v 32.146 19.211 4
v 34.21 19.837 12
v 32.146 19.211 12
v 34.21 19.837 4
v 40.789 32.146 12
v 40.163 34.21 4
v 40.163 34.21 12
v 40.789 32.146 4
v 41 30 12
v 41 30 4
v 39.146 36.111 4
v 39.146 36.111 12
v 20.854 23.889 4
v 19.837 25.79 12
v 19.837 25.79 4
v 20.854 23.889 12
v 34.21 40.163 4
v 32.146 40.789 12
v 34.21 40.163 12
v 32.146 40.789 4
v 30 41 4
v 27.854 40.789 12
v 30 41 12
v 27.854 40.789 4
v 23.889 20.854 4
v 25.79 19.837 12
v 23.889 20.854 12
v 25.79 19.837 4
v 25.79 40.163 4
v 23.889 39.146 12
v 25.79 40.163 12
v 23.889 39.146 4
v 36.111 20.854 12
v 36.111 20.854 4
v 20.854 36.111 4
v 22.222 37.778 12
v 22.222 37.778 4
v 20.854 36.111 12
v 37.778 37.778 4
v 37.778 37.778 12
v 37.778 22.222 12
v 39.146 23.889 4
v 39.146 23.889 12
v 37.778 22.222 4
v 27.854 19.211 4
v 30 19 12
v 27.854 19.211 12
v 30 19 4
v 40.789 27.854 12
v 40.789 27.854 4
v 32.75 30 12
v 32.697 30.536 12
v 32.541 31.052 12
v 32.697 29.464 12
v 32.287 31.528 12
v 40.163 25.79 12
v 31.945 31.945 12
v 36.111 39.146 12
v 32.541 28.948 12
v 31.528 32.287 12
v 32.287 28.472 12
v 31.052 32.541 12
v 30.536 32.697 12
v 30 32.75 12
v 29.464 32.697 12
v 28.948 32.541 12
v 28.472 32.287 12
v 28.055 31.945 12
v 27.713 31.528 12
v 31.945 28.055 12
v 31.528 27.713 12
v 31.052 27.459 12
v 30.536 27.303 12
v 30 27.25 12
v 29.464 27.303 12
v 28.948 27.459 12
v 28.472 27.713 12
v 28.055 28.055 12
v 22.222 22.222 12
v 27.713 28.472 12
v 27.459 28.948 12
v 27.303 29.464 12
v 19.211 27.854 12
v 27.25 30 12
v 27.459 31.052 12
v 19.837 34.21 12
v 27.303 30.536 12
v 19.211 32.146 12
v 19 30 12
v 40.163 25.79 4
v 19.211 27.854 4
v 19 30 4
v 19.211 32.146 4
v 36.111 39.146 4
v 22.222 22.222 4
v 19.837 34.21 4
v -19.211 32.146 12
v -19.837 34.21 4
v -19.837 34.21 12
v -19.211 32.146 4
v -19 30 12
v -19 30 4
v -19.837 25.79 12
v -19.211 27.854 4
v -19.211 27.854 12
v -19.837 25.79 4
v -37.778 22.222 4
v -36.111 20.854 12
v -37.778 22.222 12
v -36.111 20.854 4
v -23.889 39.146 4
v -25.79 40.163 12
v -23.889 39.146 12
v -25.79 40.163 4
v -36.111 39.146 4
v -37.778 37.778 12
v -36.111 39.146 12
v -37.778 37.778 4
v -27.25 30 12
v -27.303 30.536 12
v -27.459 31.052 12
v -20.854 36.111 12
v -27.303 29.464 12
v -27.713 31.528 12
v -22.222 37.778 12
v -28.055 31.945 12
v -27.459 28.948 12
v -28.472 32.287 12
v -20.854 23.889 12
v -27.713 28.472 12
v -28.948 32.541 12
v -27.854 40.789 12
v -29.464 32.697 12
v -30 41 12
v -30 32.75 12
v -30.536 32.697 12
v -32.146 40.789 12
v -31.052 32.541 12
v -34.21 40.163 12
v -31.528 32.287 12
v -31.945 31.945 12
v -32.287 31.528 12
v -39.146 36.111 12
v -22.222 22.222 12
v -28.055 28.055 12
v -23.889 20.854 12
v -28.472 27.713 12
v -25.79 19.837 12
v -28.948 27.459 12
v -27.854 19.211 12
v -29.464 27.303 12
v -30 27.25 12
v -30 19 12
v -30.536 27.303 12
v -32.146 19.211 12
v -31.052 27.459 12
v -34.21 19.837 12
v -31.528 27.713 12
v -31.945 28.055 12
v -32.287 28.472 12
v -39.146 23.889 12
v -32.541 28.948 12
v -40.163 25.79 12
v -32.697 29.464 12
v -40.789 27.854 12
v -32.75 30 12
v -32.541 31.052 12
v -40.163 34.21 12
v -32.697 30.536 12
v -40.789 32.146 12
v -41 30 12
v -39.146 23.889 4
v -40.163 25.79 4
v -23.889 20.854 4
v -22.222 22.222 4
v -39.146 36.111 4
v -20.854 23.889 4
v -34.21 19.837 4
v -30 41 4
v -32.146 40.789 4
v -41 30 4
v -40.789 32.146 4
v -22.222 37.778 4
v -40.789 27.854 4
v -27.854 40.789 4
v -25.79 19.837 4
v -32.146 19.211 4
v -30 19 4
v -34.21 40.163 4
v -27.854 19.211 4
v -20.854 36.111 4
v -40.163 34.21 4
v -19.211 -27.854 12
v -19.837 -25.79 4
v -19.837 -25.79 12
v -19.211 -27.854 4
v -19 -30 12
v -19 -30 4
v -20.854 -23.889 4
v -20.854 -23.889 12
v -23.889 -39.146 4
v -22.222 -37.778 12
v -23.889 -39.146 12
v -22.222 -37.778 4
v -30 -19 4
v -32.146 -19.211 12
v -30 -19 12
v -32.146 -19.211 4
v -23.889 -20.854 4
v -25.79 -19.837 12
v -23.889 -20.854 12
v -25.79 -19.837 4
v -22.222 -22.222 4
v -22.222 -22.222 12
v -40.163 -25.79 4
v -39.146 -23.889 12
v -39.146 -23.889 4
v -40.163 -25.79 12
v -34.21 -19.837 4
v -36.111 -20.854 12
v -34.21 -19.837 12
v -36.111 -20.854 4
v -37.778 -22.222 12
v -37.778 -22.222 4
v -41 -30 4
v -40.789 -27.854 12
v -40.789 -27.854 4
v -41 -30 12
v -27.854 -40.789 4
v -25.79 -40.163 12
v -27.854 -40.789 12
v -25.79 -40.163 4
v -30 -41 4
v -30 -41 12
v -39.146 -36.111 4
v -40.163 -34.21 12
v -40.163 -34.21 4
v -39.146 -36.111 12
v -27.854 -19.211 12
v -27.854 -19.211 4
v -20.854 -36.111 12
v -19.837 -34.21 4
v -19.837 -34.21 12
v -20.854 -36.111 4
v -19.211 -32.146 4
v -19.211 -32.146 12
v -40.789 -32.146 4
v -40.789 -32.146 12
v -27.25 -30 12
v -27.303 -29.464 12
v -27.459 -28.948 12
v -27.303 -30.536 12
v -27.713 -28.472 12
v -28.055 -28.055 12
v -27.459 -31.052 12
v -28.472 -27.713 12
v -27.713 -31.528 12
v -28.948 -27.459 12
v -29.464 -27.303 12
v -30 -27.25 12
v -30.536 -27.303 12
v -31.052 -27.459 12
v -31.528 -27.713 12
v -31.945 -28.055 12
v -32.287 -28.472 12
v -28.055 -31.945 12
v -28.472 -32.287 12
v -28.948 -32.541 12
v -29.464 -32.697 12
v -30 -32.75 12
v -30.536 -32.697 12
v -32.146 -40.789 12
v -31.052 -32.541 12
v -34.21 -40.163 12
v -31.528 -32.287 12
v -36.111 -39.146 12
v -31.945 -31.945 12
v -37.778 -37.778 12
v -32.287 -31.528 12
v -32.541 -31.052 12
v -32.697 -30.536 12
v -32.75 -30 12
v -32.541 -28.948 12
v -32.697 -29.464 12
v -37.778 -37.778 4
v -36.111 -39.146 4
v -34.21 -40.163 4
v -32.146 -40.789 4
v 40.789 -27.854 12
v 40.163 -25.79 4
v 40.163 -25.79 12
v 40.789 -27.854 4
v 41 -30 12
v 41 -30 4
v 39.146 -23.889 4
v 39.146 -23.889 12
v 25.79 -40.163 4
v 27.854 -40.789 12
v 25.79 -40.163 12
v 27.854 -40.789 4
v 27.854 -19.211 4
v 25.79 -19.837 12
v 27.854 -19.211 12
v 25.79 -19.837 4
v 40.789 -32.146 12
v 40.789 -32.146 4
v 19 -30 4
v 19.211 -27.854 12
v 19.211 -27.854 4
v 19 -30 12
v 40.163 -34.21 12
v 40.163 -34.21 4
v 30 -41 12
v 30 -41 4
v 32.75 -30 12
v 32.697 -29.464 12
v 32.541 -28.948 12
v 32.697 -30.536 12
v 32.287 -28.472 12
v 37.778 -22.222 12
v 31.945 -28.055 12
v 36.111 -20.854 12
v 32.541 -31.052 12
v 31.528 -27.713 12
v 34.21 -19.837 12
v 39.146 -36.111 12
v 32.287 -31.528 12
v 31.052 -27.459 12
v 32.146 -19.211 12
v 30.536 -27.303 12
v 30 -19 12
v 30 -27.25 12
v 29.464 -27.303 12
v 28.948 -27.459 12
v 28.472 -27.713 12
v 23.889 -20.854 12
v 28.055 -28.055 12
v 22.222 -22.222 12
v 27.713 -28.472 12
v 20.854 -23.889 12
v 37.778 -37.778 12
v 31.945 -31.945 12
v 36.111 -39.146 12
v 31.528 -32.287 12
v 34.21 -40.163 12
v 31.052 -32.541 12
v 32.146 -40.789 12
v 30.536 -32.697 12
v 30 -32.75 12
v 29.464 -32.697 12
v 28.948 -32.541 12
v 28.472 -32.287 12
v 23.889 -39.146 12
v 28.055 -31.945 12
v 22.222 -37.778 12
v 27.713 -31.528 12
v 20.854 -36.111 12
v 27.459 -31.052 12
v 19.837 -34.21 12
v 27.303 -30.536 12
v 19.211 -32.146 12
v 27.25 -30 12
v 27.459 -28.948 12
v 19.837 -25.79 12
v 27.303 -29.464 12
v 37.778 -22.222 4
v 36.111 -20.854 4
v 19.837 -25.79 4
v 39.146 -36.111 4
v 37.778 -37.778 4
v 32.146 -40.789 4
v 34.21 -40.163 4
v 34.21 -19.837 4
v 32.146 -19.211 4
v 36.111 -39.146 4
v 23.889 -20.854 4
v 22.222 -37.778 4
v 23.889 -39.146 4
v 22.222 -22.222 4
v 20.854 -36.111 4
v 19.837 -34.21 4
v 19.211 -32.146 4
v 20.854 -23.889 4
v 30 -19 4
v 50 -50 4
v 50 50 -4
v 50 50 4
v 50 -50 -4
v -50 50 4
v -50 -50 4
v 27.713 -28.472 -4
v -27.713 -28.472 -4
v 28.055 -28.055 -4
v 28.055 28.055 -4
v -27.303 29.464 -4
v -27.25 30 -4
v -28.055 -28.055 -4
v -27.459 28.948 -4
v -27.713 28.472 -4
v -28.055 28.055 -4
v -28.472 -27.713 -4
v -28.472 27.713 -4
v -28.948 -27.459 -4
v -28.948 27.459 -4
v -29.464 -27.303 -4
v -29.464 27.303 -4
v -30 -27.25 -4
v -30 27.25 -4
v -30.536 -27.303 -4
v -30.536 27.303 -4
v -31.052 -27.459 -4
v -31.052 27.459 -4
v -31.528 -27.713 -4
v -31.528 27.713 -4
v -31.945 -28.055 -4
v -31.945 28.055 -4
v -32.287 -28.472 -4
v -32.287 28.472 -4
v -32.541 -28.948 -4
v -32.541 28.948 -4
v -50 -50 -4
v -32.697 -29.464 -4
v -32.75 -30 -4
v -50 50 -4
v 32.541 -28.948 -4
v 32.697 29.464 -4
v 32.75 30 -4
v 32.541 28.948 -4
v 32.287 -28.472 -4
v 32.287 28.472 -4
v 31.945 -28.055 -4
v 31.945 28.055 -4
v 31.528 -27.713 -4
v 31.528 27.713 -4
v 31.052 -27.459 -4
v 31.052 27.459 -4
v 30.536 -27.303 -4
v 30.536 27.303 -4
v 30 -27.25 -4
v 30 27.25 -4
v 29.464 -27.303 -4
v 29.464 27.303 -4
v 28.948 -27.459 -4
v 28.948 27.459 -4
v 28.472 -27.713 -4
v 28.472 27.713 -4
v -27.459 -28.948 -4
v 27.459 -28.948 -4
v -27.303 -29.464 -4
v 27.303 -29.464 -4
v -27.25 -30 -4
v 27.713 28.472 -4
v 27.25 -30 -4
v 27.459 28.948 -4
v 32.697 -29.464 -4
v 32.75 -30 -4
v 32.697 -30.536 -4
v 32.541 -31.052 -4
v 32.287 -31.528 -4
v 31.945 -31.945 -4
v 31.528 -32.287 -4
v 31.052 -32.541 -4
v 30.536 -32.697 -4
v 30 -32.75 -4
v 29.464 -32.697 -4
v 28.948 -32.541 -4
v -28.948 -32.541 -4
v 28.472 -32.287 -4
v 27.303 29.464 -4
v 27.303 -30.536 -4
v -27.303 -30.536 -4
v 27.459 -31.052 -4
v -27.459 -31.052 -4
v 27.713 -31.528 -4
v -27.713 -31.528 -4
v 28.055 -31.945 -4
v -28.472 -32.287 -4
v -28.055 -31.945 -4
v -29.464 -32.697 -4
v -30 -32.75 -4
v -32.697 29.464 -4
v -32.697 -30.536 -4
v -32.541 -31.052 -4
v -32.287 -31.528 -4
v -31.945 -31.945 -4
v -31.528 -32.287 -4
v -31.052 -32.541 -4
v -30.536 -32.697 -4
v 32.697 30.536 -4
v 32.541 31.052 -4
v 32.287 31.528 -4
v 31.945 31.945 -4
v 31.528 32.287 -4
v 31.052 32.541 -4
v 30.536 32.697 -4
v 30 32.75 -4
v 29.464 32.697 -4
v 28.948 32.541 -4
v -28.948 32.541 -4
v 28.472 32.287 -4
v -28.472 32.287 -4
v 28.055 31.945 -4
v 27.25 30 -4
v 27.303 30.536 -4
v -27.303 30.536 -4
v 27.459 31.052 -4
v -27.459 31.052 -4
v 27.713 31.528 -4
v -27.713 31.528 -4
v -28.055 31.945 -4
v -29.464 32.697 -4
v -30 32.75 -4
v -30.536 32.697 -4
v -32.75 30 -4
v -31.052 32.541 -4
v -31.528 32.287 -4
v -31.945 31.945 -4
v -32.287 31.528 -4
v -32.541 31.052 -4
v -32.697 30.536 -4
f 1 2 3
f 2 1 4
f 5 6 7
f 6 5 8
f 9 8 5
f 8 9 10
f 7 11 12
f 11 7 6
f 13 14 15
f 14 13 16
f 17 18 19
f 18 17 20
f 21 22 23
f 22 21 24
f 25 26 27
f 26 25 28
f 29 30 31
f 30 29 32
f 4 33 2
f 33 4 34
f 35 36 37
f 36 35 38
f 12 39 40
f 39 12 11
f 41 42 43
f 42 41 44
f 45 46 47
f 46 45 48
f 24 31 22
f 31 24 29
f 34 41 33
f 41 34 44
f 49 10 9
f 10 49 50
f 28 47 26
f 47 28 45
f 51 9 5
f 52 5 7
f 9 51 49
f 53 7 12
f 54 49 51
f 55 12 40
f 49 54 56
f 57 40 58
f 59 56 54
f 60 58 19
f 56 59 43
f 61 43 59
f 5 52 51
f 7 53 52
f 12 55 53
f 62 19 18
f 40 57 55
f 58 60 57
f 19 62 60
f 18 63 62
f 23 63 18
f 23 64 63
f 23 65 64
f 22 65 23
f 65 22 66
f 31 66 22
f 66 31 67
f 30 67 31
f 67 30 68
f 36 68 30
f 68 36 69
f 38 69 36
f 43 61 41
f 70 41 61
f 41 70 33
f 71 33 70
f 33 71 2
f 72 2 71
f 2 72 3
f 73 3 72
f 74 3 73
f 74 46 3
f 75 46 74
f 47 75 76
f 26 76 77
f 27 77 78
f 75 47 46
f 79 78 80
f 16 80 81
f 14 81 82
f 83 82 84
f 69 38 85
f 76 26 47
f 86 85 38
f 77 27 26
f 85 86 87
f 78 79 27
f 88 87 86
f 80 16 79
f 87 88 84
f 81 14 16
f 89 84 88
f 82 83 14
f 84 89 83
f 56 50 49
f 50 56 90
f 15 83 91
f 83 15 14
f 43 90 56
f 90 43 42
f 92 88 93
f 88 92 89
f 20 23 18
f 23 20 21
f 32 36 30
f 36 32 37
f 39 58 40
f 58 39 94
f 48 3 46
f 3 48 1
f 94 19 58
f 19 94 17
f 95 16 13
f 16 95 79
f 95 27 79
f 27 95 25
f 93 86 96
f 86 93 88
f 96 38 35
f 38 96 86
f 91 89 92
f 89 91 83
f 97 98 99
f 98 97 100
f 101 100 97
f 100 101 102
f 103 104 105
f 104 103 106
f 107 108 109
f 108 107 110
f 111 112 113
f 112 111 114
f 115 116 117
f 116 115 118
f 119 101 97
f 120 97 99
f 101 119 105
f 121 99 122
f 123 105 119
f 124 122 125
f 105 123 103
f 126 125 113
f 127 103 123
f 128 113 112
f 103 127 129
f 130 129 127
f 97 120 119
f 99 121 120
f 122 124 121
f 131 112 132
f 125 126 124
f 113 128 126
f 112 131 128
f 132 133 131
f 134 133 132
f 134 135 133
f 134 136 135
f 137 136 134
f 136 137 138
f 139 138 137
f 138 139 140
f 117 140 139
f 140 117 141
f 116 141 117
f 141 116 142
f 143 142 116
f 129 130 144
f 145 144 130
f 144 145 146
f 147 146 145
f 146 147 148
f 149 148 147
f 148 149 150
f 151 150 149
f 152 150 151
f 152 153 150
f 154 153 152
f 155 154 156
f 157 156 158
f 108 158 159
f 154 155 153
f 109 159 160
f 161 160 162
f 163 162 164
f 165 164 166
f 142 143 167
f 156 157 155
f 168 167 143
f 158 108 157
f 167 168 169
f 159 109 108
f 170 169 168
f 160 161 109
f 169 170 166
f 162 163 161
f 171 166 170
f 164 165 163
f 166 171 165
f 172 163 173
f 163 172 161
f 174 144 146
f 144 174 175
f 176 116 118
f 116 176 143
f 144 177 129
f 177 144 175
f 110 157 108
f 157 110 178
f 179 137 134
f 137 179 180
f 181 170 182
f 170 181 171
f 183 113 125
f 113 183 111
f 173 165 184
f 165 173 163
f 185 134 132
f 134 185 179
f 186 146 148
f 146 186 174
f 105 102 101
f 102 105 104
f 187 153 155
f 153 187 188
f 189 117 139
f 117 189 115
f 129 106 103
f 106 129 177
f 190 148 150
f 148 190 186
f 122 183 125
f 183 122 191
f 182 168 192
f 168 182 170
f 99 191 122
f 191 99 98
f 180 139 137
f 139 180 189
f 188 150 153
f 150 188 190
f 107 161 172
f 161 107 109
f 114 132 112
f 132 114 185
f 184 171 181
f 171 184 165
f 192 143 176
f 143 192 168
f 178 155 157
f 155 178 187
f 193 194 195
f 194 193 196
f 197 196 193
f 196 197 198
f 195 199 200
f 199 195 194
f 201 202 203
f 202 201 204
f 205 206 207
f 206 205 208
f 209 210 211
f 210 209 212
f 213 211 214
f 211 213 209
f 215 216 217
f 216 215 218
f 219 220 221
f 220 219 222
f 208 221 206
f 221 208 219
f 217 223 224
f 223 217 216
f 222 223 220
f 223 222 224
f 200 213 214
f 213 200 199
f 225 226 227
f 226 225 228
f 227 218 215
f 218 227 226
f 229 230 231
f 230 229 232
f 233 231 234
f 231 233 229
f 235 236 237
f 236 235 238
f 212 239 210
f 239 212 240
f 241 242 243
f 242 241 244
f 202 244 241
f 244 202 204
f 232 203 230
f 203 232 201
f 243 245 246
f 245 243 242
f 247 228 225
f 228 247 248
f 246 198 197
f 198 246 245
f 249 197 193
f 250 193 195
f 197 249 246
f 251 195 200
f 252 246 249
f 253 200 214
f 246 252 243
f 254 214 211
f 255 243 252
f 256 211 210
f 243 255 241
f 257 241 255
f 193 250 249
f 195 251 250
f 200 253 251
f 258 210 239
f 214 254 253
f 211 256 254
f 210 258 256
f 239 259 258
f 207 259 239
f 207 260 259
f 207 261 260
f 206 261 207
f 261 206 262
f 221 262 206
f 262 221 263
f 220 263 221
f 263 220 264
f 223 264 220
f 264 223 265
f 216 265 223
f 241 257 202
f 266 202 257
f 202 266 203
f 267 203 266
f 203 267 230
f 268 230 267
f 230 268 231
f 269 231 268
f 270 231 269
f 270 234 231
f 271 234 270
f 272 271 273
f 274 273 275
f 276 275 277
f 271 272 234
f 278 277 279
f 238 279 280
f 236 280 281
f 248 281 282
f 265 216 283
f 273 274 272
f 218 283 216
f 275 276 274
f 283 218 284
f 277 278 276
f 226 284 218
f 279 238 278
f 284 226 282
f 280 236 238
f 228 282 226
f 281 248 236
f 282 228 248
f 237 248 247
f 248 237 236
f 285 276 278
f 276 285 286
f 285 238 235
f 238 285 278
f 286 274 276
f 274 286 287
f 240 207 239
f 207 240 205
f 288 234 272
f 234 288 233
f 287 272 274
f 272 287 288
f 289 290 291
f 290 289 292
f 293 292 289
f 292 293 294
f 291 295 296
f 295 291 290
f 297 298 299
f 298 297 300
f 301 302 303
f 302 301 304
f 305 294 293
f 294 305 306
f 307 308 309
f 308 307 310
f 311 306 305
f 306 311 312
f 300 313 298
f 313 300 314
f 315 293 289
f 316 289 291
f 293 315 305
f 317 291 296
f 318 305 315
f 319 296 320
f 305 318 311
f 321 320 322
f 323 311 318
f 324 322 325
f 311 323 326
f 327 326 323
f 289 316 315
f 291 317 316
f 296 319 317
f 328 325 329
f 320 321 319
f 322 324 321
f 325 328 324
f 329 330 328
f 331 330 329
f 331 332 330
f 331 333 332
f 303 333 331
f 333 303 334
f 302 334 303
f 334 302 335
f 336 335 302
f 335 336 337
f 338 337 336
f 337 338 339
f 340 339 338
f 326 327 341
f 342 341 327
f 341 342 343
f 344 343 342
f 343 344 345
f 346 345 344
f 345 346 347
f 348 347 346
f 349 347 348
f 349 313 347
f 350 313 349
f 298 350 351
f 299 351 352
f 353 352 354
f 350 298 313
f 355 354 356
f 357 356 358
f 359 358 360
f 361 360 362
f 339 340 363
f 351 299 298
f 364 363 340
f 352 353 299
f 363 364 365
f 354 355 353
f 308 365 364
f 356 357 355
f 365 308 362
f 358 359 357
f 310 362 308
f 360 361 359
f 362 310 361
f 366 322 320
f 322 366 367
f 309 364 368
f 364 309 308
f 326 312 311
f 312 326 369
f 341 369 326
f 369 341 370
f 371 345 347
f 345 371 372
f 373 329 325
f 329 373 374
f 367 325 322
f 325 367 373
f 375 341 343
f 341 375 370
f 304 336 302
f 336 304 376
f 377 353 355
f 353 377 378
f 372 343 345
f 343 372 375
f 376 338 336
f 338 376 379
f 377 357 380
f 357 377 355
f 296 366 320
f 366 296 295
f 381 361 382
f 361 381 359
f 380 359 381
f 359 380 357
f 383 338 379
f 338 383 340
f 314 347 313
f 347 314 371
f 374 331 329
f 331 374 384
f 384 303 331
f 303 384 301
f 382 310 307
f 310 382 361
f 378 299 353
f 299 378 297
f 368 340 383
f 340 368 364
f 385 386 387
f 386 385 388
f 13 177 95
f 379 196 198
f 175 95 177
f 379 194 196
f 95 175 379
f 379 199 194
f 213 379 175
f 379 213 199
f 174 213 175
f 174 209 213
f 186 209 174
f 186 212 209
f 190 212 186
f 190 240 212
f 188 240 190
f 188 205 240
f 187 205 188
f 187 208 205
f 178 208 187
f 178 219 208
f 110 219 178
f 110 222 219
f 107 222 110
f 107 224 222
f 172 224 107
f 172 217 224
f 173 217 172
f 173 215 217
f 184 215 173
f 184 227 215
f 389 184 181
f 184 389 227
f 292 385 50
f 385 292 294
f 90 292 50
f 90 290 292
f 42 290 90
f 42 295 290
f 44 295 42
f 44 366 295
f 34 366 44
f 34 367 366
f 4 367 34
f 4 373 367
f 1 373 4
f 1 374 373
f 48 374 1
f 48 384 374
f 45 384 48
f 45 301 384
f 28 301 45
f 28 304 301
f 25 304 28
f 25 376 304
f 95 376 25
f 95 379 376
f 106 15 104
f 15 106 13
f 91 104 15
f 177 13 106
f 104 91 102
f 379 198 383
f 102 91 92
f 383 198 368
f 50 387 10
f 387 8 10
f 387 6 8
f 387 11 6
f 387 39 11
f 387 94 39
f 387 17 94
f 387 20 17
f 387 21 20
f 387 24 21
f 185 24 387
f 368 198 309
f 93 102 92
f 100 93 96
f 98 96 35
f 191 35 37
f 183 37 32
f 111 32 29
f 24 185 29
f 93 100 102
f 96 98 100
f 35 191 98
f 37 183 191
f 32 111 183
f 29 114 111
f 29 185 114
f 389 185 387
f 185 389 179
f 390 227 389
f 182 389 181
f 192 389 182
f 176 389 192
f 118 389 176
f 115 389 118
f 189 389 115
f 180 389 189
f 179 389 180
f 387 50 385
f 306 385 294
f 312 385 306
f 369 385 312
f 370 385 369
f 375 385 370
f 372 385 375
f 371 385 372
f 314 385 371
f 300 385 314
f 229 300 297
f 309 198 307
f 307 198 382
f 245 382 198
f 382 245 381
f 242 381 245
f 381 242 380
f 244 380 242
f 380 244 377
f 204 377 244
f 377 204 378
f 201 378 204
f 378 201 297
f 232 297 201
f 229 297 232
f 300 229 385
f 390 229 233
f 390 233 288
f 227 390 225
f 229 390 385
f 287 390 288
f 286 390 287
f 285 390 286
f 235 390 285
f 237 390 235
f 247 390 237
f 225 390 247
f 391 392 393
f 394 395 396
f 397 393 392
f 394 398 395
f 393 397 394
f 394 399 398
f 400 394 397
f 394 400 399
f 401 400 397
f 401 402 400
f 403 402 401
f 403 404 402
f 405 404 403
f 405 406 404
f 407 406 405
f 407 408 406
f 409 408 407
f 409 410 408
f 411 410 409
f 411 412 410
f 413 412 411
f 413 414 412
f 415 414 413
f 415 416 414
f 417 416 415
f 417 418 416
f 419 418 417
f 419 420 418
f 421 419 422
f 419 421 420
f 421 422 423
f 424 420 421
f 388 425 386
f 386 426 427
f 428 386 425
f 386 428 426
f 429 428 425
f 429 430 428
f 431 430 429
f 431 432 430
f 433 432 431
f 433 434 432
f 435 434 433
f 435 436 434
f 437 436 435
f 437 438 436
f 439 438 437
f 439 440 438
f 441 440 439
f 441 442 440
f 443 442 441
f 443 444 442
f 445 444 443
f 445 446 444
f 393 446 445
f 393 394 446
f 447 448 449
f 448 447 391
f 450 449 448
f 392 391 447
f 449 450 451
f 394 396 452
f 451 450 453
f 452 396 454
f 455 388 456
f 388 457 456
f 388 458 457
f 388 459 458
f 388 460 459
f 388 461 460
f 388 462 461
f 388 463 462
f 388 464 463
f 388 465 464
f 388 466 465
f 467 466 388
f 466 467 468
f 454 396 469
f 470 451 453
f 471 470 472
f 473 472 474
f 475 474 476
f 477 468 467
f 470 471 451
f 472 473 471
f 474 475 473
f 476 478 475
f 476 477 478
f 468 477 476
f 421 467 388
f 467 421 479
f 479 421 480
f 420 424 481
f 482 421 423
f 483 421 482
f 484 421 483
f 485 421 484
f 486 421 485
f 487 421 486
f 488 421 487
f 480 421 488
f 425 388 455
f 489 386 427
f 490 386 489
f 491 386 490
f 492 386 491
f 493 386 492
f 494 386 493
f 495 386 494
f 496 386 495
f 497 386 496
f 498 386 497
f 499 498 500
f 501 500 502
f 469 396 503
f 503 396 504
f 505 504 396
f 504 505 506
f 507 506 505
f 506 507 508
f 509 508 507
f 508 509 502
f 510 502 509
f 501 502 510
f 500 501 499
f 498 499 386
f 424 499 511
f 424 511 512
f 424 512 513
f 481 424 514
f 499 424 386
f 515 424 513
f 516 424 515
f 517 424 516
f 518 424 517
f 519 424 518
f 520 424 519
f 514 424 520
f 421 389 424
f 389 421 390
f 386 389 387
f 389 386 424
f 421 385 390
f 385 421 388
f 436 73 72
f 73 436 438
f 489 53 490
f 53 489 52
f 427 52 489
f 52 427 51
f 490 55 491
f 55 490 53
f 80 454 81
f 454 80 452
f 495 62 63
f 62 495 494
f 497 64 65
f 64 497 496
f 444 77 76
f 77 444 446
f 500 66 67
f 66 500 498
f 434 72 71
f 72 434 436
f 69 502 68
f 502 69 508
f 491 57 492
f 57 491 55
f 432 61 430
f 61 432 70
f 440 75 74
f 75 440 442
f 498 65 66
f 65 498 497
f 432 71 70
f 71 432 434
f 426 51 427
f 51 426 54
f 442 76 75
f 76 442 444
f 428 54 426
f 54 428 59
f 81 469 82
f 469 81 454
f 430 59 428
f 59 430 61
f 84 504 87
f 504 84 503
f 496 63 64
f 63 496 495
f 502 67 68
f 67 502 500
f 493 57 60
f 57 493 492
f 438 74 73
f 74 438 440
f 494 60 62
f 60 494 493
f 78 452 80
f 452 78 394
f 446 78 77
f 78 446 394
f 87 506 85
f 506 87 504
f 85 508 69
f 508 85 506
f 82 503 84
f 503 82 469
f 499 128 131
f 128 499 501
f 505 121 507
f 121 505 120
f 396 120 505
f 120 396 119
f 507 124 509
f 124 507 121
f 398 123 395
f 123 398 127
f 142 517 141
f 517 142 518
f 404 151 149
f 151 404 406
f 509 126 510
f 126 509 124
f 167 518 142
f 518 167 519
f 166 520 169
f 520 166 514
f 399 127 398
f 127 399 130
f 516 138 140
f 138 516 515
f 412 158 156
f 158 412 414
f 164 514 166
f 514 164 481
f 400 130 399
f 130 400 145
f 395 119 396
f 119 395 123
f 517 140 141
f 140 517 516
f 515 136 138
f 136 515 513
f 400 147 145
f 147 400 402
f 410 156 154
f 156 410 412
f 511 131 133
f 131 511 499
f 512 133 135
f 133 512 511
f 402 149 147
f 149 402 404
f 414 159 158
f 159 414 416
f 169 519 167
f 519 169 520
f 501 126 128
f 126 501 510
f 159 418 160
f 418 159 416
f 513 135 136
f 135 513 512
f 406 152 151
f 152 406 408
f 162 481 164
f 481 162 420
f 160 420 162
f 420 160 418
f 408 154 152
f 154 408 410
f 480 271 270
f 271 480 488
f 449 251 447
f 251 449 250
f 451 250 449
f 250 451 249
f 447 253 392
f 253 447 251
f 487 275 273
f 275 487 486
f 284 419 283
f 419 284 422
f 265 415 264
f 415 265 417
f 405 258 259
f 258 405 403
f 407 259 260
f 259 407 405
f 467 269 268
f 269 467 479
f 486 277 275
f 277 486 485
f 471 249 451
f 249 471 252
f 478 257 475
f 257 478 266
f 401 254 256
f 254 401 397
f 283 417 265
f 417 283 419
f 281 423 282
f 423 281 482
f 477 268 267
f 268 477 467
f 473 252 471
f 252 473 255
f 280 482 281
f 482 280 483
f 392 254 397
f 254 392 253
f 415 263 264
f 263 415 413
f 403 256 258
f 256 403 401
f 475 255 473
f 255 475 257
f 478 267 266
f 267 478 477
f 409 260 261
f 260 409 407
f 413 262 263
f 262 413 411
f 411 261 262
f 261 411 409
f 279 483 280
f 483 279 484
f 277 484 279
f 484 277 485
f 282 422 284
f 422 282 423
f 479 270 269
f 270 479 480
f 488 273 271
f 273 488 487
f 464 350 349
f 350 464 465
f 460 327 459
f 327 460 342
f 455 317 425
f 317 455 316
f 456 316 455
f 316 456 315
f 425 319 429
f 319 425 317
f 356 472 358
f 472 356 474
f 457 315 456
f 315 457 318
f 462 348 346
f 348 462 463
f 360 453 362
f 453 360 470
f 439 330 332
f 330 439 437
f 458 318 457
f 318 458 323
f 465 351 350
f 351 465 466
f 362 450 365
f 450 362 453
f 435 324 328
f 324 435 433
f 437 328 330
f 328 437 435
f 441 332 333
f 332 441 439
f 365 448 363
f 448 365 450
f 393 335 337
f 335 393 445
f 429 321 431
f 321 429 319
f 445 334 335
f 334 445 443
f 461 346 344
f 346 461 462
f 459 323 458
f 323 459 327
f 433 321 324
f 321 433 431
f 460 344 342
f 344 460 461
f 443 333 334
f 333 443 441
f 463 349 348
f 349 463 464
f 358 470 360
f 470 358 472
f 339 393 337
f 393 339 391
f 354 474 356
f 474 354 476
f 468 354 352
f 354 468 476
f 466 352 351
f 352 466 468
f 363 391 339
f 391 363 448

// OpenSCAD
$fn = 32;

// ----------------------------------------------------------------------
// Anchor pads 100 x 100 x 16
// four corner bosses with anchor holes
// ----------------------------------------------------------------------

// --- parameters (mm) ---
plate = [100, 100, 8];  // base plate size (x, y, z)
pads = 4;               // boss count, one per corner
edge = 20;              // boss centre offset from the plate edge
boss_d = 22;            // boss diameter
boss_h = 8;             // boss height above the base plate
hole_d = 5.5;           // hole diameter

// --- derived feature positions (mm) ---
height = plate[2] + boss_h;      // = 16   overall height of the part
corner_x = plate[0] / 2 - edge;  // = 30   boss centre X
corner_y = plate[1] / 2 - edge;  // = 30   boss centre Y
feature_centers = [
  [corner_x, corner_y],
  [-corner_x, corner_y],
  [-corner_x, -corner_y],
  [corner_x, -corner_y]
];   // boss centres, anchor holes are drilled there

// base plate, four bosses standing on it, anchor holes all the way through
difference() {
  union() {
    cube(plate, center = true);
    for (centre = feature_centers)
      translate([centre[0], centre[1], plate[2] / 2 - 1])
        cylinder(d = boss_d, h = boss_h + 1);
  }
  for (centre = feature_centers)
    translate([centre[0], centre[1], -height])
      cylinder(d = hole_d, h = 2 * height + 2);  // through boss and plate
}
